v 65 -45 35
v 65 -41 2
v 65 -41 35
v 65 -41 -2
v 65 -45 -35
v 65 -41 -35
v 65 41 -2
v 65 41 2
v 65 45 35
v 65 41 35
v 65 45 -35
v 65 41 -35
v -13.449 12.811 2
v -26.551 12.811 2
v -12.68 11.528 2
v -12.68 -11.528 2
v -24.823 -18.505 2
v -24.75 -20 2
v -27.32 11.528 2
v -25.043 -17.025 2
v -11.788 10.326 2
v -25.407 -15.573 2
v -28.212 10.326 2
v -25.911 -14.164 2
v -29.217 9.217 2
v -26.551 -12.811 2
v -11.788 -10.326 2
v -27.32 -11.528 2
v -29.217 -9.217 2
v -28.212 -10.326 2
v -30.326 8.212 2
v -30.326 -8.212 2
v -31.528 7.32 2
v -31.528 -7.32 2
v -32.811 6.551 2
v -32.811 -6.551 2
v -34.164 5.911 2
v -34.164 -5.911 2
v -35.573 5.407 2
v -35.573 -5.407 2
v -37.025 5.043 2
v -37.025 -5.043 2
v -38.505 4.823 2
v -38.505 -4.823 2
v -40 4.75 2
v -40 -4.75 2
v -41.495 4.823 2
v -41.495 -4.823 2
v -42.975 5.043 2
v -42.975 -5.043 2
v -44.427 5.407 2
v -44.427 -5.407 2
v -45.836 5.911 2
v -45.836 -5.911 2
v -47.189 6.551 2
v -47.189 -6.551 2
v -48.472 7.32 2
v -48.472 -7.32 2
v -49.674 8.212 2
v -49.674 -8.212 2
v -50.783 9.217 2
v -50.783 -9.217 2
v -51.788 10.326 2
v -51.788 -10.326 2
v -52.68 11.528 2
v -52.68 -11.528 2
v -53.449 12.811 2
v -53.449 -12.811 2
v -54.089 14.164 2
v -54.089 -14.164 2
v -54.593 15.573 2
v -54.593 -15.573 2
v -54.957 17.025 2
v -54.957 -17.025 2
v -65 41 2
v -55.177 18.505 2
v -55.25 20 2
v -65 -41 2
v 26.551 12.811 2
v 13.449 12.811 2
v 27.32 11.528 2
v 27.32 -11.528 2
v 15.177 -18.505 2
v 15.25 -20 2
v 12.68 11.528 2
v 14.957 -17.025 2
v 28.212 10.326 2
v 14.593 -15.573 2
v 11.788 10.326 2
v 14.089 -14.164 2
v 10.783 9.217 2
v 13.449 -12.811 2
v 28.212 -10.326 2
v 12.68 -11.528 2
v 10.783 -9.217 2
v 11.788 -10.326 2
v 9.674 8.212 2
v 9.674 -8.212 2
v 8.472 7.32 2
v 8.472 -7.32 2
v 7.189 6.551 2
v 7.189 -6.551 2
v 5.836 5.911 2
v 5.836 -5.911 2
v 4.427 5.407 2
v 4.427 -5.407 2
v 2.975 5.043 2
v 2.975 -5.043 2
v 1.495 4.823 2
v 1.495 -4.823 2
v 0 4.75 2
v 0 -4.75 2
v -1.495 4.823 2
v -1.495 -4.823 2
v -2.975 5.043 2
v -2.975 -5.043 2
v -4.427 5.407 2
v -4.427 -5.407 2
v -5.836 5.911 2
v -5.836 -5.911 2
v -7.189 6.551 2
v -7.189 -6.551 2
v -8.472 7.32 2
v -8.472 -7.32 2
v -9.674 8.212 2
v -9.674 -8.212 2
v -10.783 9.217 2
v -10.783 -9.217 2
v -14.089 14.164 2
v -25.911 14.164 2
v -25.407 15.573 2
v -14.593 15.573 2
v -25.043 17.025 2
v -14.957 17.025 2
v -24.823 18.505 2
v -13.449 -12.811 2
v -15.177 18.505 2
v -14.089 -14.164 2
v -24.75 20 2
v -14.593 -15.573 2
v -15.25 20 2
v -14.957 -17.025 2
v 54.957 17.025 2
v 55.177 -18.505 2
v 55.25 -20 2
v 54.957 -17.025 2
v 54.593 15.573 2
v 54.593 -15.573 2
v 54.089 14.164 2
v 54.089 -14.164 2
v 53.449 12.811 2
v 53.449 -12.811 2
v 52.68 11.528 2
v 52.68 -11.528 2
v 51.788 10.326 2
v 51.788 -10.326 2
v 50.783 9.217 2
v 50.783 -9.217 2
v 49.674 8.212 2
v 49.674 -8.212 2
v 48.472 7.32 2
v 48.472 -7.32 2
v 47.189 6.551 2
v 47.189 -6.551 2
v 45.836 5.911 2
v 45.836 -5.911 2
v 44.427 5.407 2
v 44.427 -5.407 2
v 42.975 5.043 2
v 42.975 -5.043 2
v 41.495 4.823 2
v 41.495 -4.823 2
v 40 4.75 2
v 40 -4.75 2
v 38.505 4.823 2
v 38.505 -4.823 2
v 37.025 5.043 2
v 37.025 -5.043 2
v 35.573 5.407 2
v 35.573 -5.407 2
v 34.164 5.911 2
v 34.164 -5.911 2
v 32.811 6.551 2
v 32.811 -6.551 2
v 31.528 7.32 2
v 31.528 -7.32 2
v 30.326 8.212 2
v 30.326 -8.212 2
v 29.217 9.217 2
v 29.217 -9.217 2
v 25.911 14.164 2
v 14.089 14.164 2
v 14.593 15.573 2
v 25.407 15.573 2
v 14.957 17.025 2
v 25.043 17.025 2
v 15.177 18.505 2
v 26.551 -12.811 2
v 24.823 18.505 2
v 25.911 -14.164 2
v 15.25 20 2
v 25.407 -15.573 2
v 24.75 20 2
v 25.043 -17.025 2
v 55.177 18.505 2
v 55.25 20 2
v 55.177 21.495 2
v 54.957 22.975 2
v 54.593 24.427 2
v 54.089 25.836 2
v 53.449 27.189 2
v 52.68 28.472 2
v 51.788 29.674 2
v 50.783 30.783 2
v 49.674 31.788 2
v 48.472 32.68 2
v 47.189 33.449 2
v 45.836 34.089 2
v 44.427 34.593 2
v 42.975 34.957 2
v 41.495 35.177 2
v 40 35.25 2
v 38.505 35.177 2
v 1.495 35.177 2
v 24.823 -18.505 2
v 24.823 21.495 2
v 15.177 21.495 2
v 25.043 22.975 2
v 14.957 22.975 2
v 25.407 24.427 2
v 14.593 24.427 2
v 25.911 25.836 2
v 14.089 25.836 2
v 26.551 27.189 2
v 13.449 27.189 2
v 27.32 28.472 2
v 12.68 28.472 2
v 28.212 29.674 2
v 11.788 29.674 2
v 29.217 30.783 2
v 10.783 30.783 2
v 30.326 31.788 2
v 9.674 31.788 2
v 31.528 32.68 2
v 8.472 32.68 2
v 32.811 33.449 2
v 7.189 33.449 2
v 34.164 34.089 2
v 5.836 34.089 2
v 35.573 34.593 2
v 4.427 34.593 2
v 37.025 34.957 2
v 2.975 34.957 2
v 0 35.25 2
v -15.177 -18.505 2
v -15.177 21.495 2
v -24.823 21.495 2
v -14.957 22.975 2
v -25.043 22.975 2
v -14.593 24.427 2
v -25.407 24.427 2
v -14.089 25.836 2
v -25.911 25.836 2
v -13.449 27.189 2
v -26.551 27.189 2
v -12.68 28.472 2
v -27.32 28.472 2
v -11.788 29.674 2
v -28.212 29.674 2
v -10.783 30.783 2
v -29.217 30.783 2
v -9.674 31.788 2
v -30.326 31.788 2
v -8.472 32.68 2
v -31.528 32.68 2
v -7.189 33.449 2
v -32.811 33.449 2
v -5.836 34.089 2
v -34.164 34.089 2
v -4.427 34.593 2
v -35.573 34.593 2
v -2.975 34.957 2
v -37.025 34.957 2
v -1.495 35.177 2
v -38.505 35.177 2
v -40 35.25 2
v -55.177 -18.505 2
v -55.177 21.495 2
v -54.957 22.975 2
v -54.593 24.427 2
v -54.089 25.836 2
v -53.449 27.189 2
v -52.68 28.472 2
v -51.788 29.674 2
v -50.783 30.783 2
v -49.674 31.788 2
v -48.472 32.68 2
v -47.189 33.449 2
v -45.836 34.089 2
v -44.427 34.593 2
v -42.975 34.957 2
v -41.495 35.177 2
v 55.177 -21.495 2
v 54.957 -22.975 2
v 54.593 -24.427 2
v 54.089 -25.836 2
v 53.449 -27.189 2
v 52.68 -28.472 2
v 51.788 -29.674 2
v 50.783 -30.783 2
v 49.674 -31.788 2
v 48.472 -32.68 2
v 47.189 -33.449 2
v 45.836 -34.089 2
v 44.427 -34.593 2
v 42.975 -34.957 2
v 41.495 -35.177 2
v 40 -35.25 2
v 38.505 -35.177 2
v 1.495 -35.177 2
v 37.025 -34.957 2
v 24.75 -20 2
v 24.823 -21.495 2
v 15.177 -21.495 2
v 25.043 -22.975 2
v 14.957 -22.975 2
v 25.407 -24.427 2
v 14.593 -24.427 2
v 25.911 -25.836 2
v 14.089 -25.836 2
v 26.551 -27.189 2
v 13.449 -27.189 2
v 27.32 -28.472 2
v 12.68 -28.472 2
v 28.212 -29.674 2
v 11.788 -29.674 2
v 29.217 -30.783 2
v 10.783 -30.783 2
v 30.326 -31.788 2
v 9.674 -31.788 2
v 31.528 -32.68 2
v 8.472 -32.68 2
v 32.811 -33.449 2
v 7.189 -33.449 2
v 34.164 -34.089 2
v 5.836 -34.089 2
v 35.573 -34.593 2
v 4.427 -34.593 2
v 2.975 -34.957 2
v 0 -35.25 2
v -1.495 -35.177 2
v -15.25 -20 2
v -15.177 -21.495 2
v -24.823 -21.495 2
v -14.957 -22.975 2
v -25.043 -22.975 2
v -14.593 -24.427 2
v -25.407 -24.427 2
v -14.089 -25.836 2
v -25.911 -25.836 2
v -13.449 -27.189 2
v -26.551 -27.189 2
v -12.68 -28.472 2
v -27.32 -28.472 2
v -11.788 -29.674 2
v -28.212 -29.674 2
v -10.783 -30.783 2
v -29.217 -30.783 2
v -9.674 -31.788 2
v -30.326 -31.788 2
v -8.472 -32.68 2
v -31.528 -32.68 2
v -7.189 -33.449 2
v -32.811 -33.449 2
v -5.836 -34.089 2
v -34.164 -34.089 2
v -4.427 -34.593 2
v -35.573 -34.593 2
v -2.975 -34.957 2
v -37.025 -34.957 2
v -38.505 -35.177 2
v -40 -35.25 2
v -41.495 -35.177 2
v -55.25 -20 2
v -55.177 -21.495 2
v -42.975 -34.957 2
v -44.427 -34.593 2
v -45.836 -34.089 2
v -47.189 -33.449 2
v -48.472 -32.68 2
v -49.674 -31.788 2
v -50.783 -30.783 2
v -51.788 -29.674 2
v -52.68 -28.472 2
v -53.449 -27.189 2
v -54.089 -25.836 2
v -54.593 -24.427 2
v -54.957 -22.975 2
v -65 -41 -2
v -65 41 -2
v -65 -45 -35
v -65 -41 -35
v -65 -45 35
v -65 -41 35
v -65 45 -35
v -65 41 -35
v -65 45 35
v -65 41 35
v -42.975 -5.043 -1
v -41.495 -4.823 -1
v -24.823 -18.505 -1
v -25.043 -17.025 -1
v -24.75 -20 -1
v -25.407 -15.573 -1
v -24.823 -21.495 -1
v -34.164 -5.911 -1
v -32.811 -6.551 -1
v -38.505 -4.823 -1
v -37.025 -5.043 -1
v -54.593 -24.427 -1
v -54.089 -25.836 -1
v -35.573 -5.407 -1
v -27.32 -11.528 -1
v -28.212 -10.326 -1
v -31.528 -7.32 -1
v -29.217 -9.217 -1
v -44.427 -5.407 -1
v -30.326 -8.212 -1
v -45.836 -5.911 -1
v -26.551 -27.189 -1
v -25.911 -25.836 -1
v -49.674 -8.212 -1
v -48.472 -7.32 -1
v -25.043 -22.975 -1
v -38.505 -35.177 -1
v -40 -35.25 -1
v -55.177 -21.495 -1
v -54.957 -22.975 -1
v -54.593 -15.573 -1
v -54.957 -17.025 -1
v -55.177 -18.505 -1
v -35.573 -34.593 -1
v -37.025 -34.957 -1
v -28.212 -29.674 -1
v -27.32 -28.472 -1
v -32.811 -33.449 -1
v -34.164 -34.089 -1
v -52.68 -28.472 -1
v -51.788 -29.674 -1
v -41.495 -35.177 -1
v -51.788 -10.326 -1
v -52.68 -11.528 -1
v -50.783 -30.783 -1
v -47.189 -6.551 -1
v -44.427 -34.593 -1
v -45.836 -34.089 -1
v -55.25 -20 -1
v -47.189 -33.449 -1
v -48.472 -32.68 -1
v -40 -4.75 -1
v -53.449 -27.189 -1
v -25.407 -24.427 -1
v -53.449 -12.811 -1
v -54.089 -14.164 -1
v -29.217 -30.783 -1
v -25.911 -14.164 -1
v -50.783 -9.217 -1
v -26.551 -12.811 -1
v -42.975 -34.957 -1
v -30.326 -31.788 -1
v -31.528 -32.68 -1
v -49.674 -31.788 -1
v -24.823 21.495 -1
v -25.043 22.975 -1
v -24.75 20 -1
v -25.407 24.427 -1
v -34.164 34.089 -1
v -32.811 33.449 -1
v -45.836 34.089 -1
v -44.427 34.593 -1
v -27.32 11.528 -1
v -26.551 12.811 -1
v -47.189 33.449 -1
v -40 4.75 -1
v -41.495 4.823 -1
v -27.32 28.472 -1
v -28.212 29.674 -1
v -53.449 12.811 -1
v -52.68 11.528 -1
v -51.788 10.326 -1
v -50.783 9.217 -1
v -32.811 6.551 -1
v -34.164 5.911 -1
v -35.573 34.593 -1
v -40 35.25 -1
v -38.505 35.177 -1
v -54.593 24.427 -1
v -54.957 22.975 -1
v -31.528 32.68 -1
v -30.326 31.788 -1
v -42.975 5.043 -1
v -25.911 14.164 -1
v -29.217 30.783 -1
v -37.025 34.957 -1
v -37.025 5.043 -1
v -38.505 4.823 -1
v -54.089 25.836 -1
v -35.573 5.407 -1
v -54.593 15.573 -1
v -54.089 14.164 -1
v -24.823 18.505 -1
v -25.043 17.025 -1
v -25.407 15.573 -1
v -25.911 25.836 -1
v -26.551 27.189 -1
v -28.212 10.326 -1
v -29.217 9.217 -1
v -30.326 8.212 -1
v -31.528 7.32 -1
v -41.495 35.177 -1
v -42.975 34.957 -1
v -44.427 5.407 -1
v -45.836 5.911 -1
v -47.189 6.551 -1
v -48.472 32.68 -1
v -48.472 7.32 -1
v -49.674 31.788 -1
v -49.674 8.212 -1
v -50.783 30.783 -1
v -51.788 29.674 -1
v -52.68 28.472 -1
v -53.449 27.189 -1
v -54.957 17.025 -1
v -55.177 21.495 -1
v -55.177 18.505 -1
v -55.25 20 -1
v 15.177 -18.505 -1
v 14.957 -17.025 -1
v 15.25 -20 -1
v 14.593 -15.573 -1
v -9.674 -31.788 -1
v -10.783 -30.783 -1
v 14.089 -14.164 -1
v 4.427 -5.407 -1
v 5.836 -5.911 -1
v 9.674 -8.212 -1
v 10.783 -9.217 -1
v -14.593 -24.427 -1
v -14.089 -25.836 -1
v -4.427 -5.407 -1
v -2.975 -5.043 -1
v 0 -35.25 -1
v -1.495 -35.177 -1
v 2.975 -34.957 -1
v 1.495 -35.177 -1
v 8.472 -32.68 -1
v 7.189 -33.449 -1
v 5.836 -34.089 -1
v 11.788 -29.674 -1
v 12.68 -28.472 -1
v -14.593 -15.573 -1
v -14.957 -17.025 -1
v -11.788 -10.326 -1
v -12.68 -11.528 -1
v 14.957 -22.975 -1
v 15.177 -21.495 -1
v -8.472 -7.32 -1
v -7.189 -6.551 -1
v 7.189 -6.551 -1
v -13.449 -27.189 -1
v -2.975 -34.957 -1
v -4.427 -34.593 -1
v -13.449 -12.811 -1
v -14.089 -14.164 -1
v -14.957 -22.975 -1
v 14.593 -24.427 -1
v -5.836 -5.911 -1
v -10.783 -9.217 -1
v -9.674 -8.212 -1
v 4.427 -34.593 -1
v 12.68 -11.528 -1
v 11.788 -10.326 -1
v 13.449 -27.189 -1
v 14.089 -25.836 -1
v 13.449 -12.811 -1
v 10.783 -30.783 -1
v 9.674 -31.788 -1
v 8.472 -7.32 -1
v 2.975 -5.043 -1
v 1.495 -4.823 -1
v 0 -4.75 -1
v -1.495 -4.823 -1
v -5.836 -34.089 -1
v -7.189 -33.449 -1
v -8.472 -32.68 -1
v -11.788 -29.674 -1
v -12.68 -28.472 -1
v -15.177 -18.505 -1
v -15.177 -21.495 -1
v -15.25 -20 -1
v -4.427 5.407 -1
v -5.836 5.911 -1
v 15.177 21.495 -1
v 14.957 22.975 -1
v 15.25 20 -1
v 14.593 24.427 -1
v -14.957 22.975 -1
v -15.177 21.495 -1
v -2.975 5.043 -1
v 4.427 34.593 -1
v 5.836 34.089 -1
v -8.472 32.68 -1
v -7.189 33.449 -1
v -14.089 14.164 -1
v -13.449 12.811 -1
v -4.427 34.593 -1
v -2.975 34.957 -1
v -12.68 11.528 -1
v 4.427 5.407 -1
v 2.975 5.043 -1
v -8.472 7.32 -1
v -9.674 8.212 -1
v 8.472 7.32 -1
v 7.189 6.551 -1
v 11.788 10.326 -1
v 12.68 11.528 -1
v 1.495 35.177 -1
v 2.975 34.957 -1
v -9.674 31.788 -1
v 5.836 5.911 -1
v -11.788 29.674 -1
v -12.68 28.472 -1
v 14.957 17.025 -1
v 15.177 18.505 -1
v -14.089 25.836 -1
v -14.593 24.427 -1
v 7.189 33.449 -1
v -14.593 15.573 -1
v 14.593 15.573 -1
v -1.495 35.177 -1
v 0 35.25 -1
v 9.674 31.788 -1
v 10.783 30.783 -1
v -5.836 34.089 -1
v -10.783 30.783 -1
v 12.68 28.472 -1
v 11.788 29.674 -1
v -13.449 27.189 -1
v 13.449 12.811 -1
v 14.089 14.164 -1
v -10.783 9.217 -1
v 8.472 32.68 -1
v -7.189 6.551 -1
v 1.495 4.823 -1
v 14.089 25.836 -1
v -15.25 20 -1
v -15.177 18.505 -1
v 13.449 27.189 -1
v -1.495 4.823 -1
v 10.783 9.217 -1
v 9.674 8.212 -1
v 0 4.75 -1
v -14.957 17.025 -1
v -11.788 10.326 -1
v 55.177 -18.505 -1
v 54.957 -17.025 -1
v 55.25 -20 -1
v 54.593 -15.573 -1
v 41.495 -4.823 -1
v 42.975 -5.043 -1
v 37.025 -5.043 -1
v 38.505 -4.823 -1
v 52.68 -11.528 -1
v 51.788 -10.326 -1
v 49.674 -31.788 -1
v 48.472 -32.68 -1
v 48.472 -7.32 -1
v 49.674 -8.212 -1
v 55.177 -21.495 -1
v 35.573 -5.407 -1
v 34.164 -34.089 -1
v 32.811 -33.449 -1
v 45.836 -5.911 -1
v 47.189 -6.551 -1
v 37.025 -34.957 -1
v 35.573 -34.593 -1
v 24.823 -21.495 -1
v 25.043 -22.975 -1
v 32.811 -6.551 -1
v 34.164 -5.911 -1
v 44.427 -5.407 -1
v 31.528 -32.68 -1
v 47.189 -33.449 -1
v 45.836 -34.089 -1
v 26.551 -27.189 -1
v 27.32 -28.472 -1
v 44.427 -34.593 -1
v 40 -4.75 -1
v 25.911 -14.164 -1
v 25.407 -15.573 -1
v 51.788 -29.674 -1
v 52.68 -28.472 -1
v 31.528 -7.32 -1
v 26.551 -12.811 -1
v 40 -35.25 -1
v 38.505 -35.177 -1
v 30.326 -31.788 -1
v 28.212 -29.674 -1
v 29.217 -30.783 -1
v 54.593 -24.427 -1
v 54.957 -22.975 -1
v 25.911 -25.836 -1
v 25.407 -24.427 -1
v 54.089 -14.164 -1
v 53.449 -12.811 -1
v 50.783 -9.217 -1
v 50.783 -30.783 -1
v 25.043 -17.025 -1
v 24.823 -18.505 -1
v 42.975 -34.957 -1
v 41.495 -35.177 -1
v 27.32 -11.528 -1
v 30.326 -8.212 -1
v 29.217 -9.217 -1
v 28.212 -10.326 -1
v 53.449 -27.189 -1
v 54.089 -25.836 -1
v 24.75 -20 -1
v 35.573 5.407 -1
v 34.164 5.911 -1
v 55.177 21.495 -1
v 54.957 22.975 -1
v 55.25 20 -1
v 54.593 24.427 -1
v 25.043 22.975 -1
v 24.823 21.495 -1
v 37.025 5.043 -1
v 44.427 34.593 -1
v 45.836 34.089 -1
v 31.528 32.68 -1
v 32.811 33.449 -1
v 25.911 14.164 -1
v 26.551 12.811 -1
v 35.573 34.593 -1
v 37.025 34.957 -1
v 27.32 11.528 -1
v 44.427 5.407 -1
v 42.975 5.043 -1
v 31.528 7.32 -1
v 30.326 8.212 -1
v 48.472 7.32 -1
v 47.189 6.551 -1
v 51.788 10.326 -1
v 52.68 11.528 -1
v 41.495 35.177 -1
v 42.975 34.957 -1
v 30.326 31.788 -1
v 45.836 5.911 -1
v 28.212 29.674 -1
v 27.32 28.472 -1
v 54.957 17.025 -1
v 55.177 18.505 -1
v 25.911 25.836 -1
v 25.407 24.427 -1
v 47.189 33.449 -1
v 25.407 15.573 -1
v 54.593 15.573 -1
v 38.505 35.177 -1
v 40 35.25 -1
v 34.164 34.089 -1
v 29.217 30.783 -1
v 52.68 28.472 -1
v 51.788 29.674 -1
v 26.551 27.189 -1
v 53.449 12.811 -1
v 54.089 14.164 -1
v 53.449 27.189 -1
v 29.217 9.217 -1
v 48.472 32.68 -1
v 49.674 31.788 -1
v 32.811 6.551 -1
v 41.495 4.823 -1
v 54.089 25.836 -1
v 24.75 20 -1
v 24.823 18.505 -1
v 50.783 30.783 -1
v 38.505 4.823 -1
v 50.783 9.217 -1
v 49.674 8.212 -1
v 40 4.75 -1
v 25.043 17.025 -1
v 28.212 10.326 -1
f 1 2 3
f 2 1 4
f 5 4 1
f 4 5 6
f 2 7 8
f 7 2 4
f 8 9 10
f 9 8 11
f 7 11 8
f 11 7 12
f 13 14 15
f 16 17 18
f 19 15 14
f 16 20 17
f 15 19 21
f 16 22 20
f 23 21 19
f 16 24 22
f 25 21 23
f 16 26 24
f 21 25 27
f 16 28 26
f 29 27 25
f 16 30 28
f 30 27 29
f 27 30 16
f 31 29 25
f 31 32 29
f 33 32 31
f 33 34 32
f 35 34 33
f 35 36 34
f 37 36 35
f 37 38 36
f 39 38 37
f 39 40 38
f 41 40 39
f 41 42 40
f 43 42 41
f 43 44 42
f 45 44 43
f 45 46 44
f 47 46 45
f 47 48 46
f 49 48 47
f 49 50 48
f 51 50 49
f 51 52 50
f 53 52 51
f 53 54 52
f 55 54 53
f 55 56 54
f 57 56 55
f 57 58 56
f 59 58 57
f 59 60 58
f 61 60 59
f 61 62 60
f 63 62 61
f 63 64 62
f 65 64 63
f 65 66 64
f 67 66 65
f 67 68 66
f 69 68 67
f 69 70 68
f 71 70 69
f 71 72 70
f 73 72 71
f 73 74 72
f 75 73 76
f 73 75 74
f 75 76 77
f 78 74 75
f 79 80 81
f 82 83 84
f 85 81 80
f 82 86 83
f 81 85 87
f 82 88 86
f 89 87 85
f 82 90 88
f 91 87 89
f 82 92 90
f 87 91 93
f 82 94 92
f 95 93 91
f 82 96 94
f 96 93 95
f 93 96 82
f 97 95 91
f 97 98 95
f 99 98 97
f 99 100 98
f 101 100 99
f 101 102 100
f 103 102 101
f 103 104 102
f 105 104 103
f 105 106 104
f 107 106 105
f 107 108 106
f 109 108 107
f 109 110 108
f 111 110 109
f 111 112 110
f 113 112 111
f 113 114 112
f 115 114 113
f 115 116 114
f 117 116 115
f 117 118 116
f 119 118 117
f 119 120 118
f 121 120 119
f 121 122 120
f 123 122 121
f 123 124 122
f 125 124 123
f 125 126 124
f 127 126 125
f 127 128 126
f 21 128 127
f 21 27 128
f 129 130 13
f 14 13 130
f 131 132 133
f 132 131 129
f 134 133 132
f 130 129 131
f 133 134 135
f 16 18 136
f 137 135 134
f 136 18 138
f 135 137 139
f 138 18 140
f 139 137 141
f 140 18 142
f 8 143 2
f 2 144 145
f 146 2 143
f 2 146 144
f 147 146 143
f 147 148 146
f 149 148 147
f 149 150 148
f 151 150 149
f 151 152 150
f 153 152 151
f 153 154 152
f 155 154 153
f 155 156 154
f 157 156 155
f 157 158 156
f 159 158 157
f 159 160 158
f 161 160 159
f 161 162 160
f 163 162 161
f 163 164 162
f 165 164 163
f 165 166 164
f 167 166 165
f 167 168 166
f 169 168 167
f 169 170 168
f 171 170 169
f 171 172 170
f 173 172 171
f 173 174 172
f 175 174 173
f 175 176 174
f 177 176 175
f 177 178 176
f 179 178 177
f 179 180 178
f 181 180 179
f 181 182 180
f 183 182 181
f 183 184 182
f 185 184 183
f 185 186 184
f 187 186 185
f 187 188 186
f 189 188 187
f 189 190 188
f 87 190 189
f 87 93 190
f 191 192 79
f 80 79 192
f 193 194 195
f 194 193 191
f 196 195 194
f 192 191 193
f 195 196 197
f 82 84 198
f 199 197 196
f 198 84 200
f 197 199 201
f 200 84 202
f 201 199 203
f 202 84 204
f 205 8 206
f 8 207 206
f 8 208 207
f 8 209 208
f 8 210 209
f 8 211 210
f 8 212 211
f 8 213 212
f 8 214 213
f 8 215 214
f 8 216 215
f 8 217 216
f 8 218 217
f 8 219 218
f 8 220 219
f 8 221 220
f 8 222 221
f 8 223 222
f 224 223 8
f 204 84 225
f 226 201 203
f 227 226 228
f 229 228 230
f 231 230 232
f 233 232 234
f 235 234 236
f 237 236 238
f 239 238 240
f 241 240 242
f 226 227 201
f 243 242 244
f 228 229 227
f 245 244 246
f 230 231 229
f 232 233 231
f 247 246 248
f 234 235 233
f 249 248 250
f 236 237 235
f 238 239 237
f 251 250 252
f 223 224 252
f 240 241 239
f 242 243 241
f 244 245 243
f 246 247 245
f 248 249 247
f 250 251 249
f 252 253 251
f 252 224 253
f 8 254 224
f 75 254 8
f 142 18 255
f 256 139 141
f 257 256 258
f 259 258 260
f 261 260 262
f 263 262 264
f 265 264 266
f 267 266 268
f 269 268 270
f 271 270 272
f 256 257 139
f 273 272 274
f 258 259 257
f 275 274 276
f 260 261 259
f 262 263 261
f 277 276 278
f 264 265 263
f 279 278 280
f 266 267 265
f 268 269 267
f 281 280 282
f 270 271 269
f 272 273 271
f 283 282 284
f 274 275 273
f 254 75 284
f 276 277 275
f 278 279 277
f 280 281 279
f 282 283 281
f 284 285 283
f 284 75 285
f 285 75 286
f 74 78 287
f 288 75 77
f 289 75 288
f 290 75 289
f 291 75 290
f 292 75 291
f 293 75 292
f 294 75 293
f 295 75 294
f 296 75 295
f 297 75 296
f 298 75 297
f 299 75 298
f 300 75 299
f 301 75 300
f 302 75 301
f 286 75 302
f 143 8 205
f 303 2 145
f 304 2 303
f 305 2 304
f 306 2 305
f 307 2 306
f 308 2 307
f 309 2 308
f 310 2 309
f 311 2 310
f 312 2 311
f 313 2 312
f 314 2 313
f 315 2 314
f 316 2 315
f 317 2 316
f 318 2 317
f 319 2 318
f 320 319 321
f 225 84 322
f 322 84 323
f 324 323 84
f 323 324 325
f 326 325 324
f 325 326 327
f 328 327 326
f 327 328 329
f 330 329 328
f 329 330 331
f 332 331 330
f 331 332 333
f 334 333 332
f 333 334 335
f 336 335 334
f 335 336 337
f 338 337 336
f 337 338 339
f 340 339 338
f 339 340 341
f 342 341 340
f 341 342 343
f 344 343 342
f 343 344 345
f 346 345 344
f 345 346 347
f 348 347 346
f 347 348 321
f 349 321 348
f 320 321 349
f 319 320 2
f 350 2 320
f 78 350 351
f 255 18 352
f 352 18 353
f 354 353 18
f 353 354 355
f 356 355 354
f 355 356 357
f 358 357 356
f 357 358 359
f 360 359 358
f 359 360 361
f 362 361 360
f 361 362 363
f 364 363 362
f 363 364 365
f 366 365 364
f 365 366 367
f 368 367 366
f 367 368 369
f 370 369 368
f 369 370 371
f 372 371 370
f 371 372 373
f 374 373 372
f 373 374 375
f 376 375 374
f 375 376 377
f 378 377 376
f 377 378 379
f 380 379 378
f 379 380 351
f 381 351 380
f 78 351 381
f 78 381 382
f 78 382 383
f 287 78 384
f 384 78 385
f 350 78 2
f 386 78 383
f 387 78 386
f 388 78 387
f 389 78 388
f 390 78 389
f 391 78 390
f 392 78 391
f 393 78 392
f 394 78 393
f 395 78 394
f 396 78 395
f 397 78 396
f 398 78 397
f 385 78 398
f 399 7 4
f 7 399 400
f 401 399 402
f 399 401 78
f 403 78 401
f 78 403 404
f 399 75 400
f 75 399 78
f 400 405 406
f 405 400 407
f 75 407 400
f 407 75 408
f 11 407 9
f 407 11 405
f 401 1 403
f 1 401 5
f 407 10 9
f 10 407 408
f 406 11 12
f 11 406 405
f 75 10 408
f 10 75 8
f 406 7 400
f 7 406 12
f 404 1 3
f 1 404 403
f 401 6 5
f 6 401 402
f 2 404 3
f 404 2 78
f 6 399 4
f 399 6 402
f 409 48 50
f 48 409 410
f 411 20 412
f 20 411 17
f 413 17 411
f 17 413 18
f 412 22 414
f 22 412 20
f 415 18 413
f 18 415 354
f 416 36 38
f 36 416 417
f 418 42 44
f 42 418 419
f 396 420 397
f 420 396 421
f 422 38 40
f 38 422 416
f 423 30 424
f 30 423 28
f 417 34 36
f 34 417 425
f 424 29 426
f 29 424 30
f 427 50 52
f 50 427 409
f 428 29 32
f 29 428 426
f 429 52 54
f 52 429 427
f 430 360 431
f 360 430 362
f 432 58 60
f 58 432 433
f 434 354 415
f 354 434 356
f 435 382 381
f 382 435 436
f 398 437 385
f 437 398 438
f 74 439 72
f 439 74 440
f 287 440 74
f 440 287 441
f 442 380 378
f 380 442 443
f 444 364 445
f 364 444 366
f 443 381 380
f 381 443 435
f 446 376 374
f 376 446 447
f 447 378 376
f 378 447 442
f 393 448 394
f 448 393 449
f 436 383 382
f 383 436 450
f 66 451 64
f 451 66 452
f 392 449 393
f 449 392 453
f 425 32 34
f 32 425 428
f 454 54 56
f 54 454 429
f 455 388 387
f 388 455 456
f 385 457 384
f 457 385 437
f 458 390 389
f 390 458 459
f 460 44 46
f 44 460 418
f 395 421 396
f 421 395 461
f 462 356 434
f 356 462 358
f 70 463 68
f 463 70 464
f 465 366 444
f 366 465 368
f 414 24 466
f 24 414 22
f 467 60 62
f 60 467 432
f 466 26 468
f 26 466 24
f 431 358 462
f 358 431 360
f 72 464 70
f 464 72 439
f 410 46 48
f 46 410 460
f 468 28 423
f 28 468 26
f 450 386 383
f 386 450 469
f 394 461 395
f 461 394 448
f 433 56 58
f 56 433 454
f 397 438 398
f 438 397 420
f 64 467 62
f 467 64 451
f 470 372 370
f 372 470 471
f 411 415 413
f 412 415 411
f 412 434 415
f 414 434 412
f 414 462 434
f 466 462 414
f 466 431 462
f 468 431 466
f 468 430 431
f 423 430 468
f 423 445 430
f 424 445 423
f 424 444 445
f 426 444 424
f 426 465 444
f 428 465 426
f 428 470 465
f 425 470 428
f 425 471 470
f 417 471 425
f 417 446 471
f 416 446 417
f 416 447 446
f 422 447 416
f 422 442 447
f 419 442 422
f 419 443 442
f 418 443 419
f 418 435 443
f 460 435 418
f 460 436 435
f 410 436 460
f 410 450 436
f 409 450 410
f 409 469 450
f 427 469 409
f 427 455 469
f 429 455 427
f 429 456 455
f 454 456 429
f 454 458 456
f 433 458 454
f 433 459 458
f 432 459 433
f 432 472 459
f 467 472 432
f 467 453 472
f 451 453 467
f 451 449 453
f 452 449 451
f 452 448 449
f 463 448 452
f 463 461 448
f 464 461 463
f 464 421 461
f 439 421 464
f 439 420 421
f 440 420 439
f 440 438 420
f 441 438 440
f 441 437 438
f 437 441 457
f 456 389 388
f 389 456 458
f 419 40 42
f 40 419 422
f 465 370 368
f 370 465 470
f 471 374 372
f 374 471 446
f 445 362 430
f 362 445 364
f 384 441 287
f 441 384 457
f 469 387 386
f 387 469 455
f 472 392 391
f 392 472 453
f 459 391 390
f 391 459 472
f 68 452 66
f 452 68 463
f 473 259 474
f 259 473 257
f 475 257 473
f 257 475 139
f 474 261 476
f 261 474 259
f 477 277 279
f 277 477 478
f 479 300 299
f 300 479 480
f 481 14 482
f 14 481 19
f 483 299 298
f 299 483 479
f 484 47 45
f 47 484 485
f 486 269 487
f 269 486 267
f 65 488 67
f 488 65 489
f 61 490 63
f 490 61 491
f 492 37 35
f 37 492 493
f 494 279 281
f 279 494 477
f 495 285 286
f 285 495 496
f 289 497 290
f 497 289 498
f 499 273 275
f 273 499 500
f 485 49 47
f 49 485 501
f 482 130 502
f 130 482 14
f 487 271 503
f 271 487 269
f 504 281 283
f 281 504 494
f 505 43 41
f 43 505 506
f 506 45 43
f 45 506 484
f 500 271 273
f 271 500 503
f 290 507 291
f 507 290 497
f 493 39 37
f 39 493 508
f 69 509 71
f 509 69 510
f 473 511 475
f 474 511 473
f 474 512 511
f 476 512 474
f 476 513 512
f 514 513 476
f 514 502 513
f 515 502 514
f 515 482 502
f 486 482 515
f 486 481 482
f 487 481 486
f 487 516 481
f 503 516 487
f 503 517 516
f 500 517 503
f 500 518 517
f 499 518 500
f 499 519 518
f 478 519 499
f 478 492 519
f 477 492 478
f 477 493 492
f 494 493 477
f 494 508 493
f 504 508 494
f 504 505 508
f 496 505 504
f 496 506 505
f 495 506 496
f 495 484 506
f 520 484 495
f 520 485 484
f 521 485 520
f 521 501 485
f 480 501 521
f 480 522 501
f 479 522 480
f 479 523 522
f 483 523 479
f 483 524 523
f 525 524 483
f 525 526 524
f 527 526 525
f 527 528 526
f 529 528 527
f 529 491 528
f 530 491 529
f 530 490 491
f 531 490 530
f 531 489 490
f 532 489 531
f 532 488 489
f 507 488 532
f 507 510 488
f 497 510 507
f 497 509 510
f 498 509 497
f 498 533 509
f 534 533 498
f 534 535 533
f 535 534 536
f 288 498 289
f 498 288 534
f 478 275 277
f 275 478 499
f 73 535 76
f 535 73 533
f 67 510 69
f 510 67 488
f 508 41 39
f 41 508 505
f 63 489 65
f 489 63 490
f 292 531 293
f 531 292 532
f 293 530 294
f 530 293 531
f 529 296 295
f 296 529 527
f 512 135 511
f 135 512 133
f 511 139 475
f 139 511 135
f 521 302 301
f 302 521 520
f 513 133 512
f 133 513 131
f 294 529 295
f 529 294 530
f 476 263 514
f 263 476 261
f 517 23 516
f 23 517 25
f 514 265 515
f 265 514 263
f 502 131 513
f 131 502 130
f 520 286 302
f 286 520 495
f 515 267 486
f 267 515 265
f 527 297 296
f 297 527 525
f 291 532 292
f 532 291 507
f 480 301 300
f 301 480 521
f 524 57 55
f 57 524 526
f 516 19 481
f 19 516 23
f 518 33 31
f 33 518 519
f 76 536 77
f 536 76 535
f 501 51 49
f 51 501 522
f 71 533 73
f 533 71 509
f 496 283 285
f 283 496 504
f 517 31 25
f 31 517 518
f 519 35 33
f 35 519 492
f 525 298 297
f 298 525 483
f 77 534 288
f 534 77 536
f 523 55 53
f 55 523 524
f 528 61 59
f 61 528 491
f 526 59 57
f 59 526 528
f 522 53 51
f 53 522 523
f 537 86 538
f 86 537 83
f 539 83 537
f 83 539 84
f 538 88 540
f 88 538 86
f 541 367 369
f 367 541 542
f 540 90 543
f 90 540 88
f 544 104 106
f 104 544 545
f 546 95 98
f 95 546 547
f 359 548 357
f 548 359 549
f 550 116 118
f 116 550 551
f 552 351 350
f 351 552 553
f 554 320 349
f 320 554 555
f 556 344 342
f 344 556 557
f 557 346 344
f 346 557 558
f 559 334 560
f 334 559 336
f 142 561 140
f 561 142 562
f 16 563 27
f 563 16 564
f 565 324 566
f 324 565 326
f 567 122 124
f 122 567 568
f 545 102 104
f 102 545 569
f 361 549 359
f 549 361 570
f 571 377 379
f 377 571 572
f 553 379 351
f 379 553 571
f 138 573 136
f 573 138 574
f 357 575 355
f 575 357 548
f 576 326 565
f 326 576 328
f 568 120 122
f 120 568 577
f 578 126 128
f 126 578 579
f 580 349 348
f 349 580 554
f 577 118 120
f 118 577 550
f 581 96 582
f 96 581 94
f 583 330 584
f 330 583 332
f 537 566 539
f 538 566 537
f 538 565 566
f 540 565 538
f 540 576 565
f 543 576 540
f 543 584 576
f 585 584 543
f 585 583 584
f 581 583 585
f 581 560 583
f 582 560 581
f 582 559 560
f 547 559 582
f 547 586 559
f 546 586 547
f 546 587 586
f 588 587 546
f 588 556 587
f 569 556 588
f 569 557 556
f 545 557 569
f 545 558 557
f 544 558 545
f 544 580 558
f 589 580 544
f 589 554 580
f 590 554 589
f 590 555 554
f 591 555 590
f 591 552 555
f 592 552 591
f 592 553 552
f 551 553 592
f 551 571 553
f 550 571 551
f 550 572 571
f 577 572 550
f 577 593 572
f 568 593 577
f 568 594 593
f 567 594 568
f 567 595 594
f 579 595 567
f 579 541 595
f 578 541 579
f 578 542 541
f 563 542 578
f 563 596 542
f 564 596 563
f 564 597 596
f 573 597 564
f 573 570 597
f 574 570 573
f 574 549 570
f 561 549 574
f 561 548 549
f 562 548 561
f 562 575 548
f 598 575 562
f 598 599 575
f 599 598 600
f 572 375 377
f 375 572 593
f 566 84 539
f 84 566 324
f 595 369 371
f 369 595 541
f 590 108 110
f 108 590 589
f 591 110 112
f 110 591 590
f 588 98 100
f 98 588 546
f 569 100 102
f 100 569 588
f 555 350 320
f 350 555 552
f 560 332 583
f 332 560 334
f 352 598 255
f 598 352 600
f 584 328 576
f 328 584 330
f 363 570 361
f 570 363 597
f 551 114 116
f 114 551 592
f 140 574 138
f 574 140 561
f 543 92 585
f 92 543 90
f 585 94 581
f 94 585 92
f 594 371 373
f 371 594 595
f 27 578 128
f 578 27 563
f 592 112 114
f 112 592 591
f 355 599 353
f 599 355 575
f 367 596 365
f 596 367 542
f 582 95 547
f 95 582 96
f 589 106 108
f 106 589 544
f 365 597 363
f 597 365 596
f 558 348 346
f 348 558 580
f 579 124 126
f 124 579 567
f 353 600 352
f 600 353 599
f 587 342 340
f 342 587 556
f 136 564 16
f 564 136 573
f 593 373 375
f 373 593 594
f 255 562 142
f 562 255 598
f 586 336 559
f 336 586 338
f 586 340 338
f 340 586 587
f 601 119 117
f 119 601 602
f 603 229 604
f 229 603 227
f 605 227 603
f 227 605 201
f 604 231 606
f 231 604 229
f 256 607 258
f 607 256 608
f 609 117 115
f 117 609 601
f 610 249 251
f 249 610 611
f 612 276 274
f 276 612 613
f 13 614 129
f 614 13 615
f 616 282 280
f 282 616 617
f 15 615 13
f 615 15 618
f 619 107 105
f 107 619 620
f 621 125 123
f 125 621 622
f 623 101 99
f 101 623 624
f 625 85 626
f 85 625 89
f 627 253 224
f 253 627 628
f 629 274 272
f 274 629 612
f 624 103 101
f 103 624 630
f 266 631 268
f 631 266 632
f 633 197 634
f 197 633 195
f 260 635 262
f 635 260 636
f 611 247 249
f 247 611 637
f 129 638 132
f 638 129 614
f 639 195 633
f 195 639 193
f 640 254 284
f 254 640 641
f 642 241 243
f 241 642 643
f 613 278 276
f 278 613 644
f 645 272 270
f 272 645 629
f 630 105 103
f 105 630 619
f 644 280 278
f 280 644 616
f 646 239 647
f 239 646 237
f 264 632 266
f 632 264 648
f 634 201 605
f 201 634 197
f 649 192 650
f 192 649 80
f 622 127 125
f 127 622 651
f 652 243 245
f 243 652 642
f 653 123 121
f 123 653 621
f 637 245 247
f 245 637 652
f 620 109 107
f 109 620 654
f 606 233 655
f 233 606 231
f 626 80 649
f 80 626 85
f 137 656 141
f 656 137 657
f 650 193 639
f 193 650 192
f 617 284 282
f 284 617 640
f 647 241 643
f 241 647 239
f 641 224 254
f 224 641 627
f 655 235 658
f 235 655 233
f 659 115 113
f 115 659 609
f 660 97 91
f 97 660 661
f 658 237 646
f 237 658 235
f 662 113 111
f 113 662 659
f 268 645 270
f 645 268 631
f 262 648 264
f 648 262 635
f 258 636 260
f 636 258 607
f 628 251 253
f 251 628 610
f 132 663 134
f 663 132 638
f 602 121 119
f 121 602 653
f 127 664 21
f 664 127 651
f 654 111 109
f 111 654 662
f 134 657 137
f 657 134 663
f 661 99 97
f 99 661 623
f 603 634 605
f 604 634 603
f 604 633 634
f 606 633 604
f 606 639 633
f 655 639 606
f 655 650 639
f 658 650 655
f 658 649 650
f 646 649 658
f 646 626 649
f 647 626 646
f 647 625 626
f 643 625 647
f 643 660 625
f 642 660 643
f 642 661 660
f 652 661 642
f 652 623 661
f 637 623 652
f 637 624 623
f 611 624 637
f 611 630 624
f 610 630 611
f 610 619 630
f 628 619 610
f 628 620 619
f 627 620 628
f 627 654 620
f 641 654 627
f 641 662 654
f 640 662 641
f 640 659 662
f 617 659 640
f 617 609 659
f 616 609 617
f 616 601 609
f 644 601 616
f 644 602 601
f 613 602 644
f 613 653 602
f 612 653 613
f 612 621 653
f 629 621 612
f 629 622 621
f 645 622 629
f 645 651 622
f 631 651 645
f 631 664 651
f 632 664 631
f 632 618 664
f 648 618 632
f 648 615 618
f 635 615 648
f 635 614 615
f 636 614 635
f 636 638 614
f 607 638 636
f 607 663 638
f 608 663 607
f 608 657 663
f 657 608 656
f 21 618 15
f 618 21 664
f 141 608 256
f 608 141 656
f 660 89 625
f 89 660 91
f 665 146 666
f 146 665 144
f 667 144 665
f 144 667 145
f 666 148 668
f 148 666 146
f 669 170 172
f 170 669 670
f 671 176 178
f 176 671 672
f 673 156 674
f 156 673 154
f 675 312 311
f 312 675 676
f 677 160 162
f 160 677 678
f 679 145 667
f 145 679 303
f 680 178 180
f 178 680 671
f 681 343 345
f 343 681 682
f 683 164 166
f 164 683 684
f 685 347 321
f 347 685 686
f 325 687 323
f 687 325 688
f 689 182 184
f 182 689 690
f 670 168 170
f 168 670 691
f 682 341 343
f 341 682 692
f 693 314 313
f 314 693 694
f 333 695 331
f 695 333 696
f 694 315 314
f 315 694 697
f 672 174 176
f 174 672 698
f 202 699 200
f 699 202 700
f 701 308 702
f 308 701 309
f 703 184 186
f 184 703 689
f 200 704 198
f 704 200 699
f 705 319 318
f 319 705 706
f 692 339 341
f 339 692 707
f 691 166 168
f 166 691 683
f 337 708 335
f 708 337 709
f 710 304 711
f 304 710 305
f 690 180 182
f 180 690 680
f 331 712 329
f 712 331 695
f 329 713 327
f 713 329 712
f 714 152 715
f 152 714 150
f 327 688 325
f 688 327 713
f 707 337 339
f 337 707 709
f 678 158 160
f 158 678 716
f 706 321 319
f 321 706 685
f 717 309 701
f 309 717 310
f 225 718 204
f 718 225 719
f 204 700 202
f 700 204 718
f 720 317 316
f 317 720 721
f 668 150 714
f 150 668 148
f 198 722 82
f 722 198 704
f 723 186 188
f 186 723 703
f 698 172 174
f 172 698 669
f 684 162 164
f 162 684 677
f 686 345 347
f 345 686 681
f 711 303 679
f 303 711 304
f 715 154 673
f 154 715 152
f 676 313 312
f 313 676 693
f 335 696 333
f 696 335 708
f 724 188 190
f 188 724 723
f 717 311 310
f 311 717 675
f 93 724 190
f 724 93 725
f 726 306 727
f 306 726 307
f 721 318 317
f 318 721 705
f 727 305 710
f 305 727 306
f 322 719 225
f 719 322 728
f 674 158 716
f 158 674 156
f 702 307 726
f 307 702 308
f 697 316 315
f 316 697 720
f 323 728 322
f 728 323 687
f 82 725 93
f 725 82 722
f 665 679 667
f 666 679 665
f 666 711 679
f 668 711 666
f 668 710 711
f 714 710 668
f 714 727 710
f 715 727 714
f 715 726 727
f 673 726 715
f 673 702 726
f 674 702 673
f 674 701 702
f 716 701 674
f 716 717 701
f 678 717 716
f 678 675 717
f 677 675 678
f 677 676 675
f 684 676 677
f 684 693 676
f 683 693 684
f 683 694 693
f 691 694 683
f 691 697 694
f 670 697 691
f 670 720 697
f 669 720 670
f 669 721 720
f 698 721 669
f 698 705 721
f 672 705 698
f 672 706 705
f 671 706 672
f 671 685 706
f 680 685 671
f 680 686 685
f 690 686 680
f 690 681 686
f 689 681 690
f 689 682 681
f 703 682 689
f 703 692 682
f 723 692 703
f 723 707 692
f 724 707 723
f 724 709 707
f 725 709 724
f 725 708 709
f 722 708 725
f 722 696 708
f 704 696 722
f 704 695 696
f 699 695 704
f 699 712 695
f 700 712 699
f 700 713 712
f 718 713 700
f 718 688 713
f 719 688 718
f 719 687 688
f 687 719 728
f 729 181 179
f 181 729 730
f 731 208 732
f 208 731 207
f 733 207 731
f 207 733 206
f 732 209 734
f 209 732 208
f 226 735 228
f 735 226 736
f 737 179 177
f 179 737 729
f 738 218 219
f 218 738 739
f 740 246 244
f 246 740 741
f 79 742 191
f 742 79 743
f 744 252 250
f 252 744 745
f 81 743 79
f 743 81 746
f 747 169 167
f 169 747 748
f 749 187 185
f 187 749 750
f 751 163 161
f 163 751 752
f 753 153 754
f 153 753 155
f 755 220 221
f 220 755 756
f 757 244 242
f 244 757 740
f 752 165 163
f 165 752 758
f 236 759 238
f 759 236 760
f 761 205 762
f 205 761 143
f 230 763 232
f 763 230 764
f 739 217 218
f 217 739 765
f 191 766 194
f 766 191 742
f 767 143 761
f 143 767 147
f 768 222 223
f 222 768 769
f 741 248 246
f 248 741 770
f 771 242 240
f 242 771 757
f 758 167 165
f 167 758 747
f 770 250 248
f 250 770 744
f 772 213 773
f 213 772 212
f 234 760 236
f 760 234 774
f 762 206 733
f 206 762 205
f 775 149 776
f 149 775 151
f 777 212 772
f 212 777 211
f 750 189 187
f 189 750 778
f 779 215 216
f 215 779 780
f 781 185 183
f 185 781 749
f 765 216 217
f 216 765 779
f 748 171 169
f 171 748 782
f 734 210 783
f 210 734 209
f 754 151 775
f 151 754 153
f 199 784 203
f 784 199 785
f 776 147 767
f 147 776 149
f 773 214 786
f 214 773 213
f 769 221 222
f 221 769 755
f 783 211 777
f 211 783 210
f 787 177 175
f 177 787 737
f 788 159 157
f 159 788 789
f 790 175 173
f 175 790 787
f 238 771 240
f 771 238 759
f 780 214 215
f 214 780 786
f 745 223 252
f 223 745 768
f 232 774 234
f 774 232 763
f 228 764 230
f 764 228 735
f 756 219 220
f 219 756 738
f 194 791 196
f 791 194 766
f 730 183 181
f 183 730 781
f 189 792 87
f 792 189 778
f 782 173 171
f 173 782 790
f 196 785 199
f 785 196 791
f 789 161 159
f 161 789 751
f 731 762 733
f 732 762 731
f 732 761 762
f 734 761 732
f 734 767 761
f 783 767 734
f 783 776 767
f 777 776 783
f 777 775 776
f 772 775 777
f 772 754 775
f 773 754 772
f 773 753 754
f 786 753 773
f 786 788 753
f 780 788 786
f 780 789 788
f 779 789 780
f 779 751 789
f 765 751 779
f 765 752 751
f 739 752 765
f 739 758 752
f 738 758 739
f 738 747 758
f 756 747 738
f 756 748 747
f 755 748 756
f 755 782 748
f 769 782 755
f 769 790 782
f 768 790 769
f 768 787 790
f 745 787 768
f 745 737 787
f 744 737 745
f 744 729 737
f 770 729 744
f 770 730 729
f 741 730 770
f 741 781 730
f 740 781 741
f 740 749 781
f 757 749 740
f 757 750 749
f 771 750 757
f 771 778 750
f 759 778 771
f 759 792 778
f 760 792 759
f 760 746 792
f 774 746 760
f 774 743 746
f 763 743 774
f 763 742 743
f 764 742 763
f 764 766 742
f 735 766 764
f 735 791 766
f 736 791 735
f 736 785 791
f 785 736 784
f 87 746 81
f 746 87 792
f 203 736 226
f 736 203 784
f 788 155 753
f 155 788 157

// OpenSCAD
// 50 mL conical tube rack – printed upside-down, then flipped over.
// Print orientation: flat plate on the bed (z = 0..4), walls rising in +Z.
// After flipping, the rack stands on the two walls and tubes pass through the holes.

// ---- Dimensions (mm) ----
plate_X   = 130;   // plate length along X
plate_Y   = 90;    // plate width along Y
plate_T   = 4;     // plate thickness (z = 0 to 4)

wall_T    = 4;     // wall thickness (Y)
wall_H    = 70;    // wall height above the bed (z = 0 to 70)

hole_D    = 30.5;  // through-hole diameter
hole_R    = hole_D / 2;

pitch_X   = 40;    // hole centre spacing along X
pitch_Y   = 40;    // hole centre spacing along Y

$fn = 64;          // roundness for holes

// Hole centre coordinates: 2 rows (Y) x 3 columns (X), centred on the plate.
hole_X = [-pitch_X, 0, pitch_X];
hole_Y = [-pitch_Y / 2, pitch_Y / 2];

// ---- Base plate (z = 0 to plate_T) ----
module plate() { translate([0, 0, 0])
    cube([plate_X, plate_Y, plate_T], center = true); }

// ---- Two long-edge walls (z = 0 to wall_H), flush with the plate's long edges ----
// Wall 1: along +Y edge (y = +plate_Y/2)
module wall_1() { translate([0,  plate_Y / 2 - wall_T / 2, 0])
    cube([plate_X, wall_T, wall_H], center = true); }

// Wall 2: along -Y edge (y = -plate_Y/2)
module wall_2() { translate([0, -plate_Y / 2 + wall_T / 2, 0])
    cube([plate_X, wall_T, wall_H], center = true); }

// ---- Six through-holes (extend 1 mm past each face to avoid coplanar cuts) ----
module holes() { for (hx = hole_X, hy = hole_Y)
    translate([hx, hy, -1])
        cylinder(h = plate_T + 2, r = hole_R, $fn = $fn); }

// ---- Final solid ----
difference() {
    union() {
        plate();
        wall_1();
        wall_2();
    }
    holes();
}
